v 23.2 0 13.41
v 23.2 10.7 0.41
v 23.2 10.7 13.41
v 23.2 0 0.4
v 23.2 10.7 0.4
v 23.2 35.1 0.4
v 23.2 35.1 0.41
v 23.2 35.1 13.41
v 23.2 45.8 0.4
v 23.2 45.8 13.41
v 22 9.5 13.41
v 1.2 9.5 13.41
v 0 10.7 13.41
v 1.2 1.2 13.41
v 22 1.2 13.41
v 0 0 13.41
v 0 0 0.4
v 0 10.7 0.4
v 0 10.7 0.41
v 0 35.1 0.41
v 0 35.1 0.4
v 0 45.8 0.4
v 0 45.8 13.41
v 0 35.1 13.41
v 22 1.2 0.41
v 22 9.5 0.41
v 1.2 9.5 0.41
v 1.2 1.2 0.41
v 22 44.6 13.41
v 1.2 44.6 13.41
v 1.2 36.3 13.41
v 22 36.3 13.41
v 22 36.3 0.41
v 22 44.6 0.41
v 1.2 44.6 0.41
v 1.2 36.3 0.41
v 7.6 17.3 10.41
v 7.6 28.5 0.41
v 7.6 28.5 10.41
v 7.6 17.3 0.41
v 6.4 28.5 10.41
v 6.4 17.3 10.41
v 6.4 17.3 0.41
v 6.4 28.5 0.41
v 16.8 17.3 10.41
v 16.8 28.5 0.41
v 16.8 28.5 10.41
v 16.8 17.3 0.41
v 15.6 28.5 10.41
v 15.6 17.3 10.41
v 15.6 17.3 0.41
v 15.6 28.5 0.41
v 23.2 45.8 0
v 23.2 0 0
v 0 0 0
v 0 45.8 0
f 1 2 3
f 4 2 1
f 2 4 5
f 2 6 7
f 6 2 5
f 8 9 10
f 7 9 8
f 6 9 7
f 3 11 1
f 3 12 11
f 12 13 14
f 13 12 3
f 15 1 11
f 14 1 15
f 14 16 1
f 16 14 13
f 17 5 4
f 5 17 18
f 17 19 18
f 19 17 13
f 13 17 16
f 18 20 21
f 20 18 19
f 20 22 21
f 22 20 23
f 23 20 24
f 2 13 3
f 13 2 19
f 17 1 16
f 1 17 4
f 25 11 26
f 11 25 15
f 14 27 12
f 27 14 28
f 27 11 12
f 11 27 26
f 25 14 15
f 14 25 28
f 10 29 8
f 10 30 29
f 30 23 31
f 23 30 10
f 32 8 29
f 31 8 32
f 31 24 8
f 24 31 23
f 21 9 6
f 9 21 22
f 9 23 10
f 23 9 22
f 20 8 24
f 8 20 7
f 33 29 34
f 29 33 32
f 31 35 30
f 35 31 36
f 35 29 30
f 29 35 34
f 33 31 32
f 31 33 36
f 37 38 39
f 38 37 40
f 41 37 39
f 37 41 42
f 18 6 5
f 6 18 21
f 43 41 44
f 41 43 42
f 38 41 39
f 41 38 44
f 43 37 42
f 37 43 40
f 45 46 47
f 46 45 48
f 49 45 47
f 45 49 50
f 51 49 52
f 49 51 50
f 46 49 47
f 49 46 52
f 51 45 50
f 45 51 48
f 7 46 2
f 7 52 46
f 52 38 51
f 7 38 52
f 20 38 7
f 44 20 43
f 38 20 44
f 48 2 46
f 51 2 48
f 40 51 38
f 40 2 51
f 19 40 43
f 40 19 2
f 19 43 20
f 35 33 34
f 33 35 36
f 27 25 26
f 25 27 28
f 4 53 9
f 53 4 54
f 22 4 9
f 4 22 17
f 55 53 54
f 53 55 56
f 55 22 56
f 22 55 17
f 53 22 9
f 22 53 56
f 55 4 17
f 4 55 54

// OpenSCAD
// file: ../../Base/Boxes.scad
// Fischertechnik Box Foundation
// Pre-designed Boxes

use <Constants.scad>

include <PlacementOptions.scad>

box190Width = 190;
box190Depth = 130;
box130Width = 130;
box130Depth = 95;
boxUsageHeight = 33.9;
boxWallThickness = 2.4;
boxBaseThickness = 1.0;
boxWebWidth = 3.0;

// getBoxWallThickness()
// Gets the wall thickness of a Fischertechnik Box

function getBoxWallThickness() = boxWallThickness;

// Gets the usable height of a fischertechnik box
function getBoxUsageHeight() = boxUsageHeight;

// Gets the thickness of the Fischertechnik box base.
function getBoxBaseThickness() = boxBaseThickness;

// Gets the width of a box web
function getBoxWebWidth() = boxWebWidth;

// Gets the usable inner space of a Box 190 as an x/y-list
function getBox190Space() = [
    box190Width - 2*getBoxWallThickness(), 
    box190Depth - 2*getBoxWallThickness() ];

// Imports the Fischertechnik empty box 130x190 mm and places it at position 0,0
// 190x130 are the outer sizes, the inner space is slightly smaller. Use getBox190Space() to get the inner sizes.
// This module needs the STL file "Fischertechnik Box 130x190.stl" in the library path.
// The box is positioned that the usable inner space is at the 0,0,0 position. The

module Box190() {
    translate([-getBoxWallThickness(),-getBoxWallThickness(),-getBoxBaseThickness()])
        import("Fischertechnik Box 130x190.stl", convexity=3);
}

// Gets the usable inner space of a Box 130 as an x/y-list
function getBox130Space() = [
    box130Width - 2*getBoxWallThickness(), 
    box130Depth - 2*getBoxWallThickness() ];

// Imports the Fischertechnik empty box 95x130 mm and places it at position 0,0
// 190x130 are the outer sizes, the inner space is slightly smaller. Use getBox190Space() to get the inner sizes.
// This module needs the STL file "Fischertechnik Box 95x130.stl" in the library path.
// The box is positioned that the usable inner space is at the 0,0,0 position. The

module Box130() {
    translate([-getBoxWallThickness(),-getBoxWallThickness(),-getBoxBaseThickness()])
        import("Fischertechnik Box 95x130.stl", convexity=3);
}

// Creates a web at the specified box walls
// corner 0 = LowerLeft, 1 = UpperLeft, 2 = UpperRight, 3 = LowerRight
// side 0 = LeftOfCorner, 1 = RightOfCorner
// distance = Distance in mm from the corner
// box = inner width and depth of the box (default: Box 190)
// webWidth = length of the web (default is 3 mms)
// webThickness = thickness of the web (default is 1 mm)

module BoxWeb(corner, side, distance, box=getBox190Space(), webWidth=getBoxWebWidth(), webThickness=1.0) {
    sink = getBoxWallThickness()/2;

    width = (corner % 2 == 0) ? 
            (side == LeftOfCorner ? webWidth : webThickness) :
            (side == LeftOfCorner ? webThickness : webWidth);

    depth = (corner % 2 == 0) ? 
            (side == RightOfCorner ? webWidth : webThickness) :
            (side == RightOfCorner ? webThickness : webWidth);
    
    xDiff = corner == LowerLeft ? 
                (side == LeftOfCorner ? -sink : distance) :
            (corner == UpperLeft ?                
                (side == LeftOfCorner ? distance : -sink) :
            (corner == UpperRight ?
                (side == LeftOfCorner ? box.x-webWidth+sink : box.x-distance-webThickness) :
                (side == LeftOfCorner ? box.x-distance-webThickness: box.x-webWidth+sink)));

    yDiff = corner == LowerLeft ? 
                (side == RightOfCorner ? -sink : distance) :
            (corner == UpperLeft ?
                (side == RightOfCorner ? box.y-distance : box.y-webWidth+sink) :
            (corner == UpperRight ?
                (side == RightOfCorner ? box.y-webWidth+sink : box.y-distance) :
                (side == RightOfCorner ? distance : -sink)));
    
    translate([xDiff, yDiff, -getExcess()])
        cube([width, depth, boxUsageHeight + 2*getExcess()]);
}
// file: ../../Base/Rotation.scad
// Fischertechnik Box Foundation
// Geometry Helpers Rotation

include <PlacementOptions.scad>

// getRotatedSpace(space, rotation=NoRotation)
// Rotates the space dependent on the specified rotation

function getRotatedSpace(space, rotation=NoRotation) = [
    (rotation == Rotate90 || rotation == Rotate270) ? space.y : space.x,
    (rotation == Rotate90 || rotation == Rotate270) ? space.x : space.y
];

// Rotates the given space around the fixed left lower corner
// space = the space the children needs as width/depth list [width,depth]
// rotation = 0 Rotate0 degrees, 1 Rotate90 degrees, 2 Rotate180 degrees, 3 Rotate270 degrees (equivalent to -90)

module RotateFix(space, rotation=Rotate0) {
    dy = (rotation == Rotate0 || rotation == Rotate270) ? 0 :
        (rotation == Rotate90) ? space.x :
        space.y;
    dx = (rotation < Rotate180) ? 0 :
        (rotation == Rotate180) ? space.x :
        space.y;
    
    translate([dx, dy, 0])
        rotate([0, 0, rotations[rotation]])
            children();
}
// file: ../../Base/Alignment.scad
// Fischertechnik Box Foundation
// Geometry Helpers Alignment

include <PlacementOptions.scad>

// getAlignedX(elementWidth, spaceWidth, align=AlignRight, offset=0)
// Gets the aligned X offset of an element with the given
// width in the given space.
// elementWidth = The width of the element to positon
// spaceWidth = The space where the element should be aligned
// align = 0 AlignLeft, 1 AlignCenter, 2 AlignRight
// offset = an optional offset from the aligned position. When
// aligned left or centered, then positive values are in X direction.
// When aligned right then positive values are in negative X direction.

function getAlignedX(elementWidth, spaceWidth, align=AlignRight, offset=0) =
    (align == AlignLeft) ?
        offset :
        ((align == AlignCenter) ?
        (spaceWidth - elementWidth)/2 + offset :
        spaceWidth - offset - elementWidth);

// getAlignedY(elementDepth, spaceDepth, align=AlignTop, offset=0)
// Gets the aligned Y offset of an element with the given
// depth in the given space.
// elementDepth = The depth of the element to positon
// spaceDepth = The space where the element should be aligned
// align = 0 AlignBottom, 1 AlignCenter, 2 AlignTop
// offset = an optional offset from the aligned position. When
// aligned bottom or centered, then positive values are in Y direction.
// When aligned top then positive values are in negative Y direction.

function getAlignedY(elementDepth, spaceDepth, align=AlignTop, offset=0) =
    (align == AlignBottom) ?
        offset :
        ((align == AlignCenter) ?
        (spaceDepth - elementDepth)/2 + offset :
        spaceDepth - offset - elementDepth);
// file: ../../Base/PlacementOptions.scad
// Fischertechnik Box Foundation
// Placement Options

// Alignment
NoAlign = 0;
AlignLeft = 1;
AlignBottom = 2;
AlignCenter = 3;
AlignRight = 4;
AlignTop = 5;

// Element rotation degree steps
rotations = [0, -90, -180, -270];

// Rotation
NoRotation = 0;
Rotate0 = 0;
Rotate90 = 1;
Rotate180 = 2;
Rotate270 = 3;

// Docking (seen from above)
NoDock = -1;
DockLeft = 0;
DockTop = 1;
DockRight = 2;
DockCorner = 2;
DockBottom = 3;

// Web corners
LowerLeft = 0;
UpperLeft = 1;
UpperRight = 2;
LowerRight = 3;

// Web position relative to corner
LeftOfCorner = 0;
RightOfCorner = 1;
// file: ../../Base/Placement.scad
// Fischertechnik Box Foundation
// Geometry Helpers Placement

use <Constants.scad>
use <Alignment.scad>
use <Rotation.scad>
use <Boxes.scad>

include <PlacementOptions.scad>

// Place(x=0, y=0, elementSpace=[0,0], alignX=AlignLeft, alignY=AlignBottom, rotation=Rotate0, boxSpace=getBox190Space())
// Places the child at the specified position
// y = Y-Position. This is a relative position when an X aligment is specified.
// x = X-Position. This is a relative position when an Y aligment is specified.
// elementSpace = space of the element to be placed [x,y]
// alignX = -1=NoAlign, 0 AlignLeft, 1 AlignCenter, 3 AlignRight (elementSpace and boxSpace required!)
// alignY = -1=NoAlign, 2 AlignBottom, 1 AlignCenter, 4 AlignTop (elementSpace and boxSpace required!)
// rotation = 0 Rotate0 0 degrees, 1 Rotate90 90 degrees, 
// 2 Rotate180 180 degrees, 3 Rotate270 270 degrees (equivalent to -90)
// boxSpace = Inner space of the box where the placement occurs [x,y] - default is Box 190x130 inner space

module Place(x=0, y=0, elementSpace=[0,0], 
  alignX=AlignLeft, alignY=AlignBottom, 
  rotation=NoRotation, boxSpace=getBox190Space()) {

    module Position(x, y, space, rotation=Rotate0) {
        translate([x, y, 0])
            RotateFix(space, rotation)
                children();
    }

    space = getRotatedSpace(elementSpace, rotation);
    alignedX = getAlignedX(space.x, boxSpace.x, alignX, x);
    alignedY = getAlignedY(space.y, boxSpace.y, alignY, y);
    Position(alignedX, alignedY, elementSpace, rotation)
        children();
}

// Center(space=getBox130Space(), elementSpace=[0,0])
// space = Space where the children is centered. For cylinder use centered=true and no elementSpace.
// elementSpace = space of the element to be centered [x,y]

module Center(space=getBox190Space(), elementSpace=[0,0]) {
    translate([(space.x - elementSpace.x) / 2, (space.y - elementSpace.y) / 2])
        children(0);
}

// CenterHorizontal(width=0, y=0, offset=0, space=getBox130Space())
// space = Space where the children is centered. For cylinder use centered=true and no elementSpace.
// elementSpace = space of the element to be centered [x,y]

module CenterHorizontal(width=0, y=0, offset=0, space=getBox190Space()) {
    translate([(space.x - width) / 2 + offset, y])
        children(0);
}

// CenterVertical(depth=0, x=0, offset=0, space=getBox130Space())
// space = Space where the children is centered. For cylinder use centered=true and no elementSpace.
// elementSpace = space of the element to be centered [x,y]

module CenterVertical(depth=0, x=0, offset=0, space=getBox190Space()) {
    translate([x, (space.y - depth) / 2 + offset])
        children(0);
}
// file: ../../Elements/FrameLockingRing.scad
// Fischertechnik Box Library
// Frame for Locking Ring
// 31020

use <../Base/Constants.scad>
use <../ModelBase/Simple.scad>

width = 20;
depth = 7.5;
height = 13;

// getFrameLockingRingSpace(columns=1, rows=1)
// columns = Count of locking rings in X direction (width of ring)
// rows = Count of locking rings in Y direction (depth of ring)
// Gets the space the frame locking ring needs as width (.x and .y as a list)

function getFrameLockingRingSpace(columns=1, rows=1) = getFrameOuterVolume([width*columns, depth*rows, height]);

// FrameLockingRing(columns, rows, smallSideIsX)
// columns = Count of locking rings in X direction (width of ring)
// rows = Count of locking rings in Y direction (depth of ring)
// The walls of the frame are 13 mm high. The small side is 7.5 mm wide, the large side
// is 20 mm wide.

module FrameLockingRing(columns=1, rows=1) {
    Frame([width*columns, depth*rows, height]);
}

// Tests
color("lightgray")
    FrameLockingRing(1);
// file: ../../Elements/HolderWinchDrum.scad
// Fischertechnik Box Library
// Holder for Winch Drum
// 31016

use <../Base/Constants.scad>
use <../Base/Placement.scad>
use <../ModelBase/Simple.scad>

width = 20;
depth = 25;
height = 10;

// getWinchDrumHolderSpace()
// Gets the space the winch drum holder needs as width and depth (.x and .y as a list)

function getHolderWinchDrumSpace() = [width, depth, height];

// HolderWinchDrum()
// Two walls for holding the 31016 winch drum.

module HolderWinchDrum() {
    holderDepth = 11.2;
    holderDistance = 8;
    
    Space(getHolderWinchDrumSpace());
    
    module Holders() {
        Wall([getDividerThickness(), holderDepth, height]);
        translate([holderDistance + getDividerThickness(), 0])
            Wall([getDividerThickness(), holderDepth, height]);
    }
    
    Center(getHolderWinchDrumSpace(), [holderDistance + 2*getDividerThickness(), holderDepth]) {
        Holders();
    }
}

// Tests
color("lightgray")
HolderWinchDrum();
// file: ../../Elements/AxisClip10.scad
// Fischertechnik Box Library
// Axis for clip 10
// 31023

use <../ModelBase/Simple.scad>

width = 12;
depth = 12;
height = 23;

// getAxisClip10Space()
// Gets the space of a frame for a clip 10 with spring ring (mot2)

function getAxisClip10Space() = [width, depth, height];

// AxisClip10()
// Axis for clip 10 with spring ring (mot2)

module AxisClip10() {
    LeveledAxisWithSpace(height, height-10, getAxisClip10Space());
}

// Tests
color("lightgray")
AxisClip10();
// file: ../../Base/Constants.scad
// Fischertechnik Box Foundation
// Constants

// Constant values necessary for multiple elements

// Base constants
dividerThickness = 1.2;
excess = 0.01;
fragments = 90;
tolerance = 0.8;

// Gets the thickness of a divider 
function getDividerThickness() = dividerThickness;

// Gets the excess that is used to merge walls into each other
function getExcess() = excess;

// Gets amount of fragments of a cylinder
function getFragments() = fragments;

// Gets the inner tolerance of a frame to each side
function getTolerance() = tolerance;


// Fischertechnik specific constants
axisDiameter = 4;
axisBottomDiameter = axisDiameter + 1;
standardEdgeDistance = 2.5;
standardWebDistance = 11.5;
standardCornerLength = 15;
tubeWallFactor = 0.8;

// Gets axis diameter
function getAxisDiameter() = axisDiameter;

// Gets axis bottom diameter for thicker part at the bottom
function getAxisBottomDiameter() = axisBottomDiameter;

// gets the standard distance to the wall of the box for dockable frames with webs
function getStandardEdgeDistance() = standardEdgeDistance;

// gets the standard distance of each web to the corner of the dockable frame
function getStandardWebDistance() = standardWebDistance;

// gets the standard length of the corner walls of a dockable frame
function getStandardCornerLength() = standardCornerLength;

// gets the wall thickness of a tube.
function getTubeWallThickness() = tubeWallFactor * getDividerThickness();
// file: ../../Elements/HolderWinchDrumWithLockingRings.scad
// Fischertechnik Box Library
// Complete Winch Drum with Locking Rings
// 31018 + 2 x 31020

use <../ModelBase/Simple.scad>
use <HolderWinchDrum.scad>
use <FrameLockingRing.scad>

distance = 24.4;

// getHolderWinchDrumWithLockingRingsSpace()
// Gets the space the holder winch drum with locking rings needs as width (.x and .y as a list)

function getHolderWinchDrumWithLockingRingsSpace() = [
    getFrameLockingRingSpace().x, 
    getFrameLockingRingSpace().y * 2 + distance,
    getFrameLockingRingSpace().z];

// HolderWinchDrumWithLockingRings
// Combination of a winch drum holder with two locking ring holders at both ends

module HolderWinchDrumWithLockingRings() {    
    yOffsetFrame = distance + getFrameLockingRingSpace()[1];
    
    Space(getHolderWinchDrumWithLockingRingsSpace());
    
    FrameLockingRing();
    translate([0, yOffsetFrame, 0])
        FrameLockingRing();
    
    xOffset = (getFrameLockingRingSpace()[0] - getHolderWinchDrumSpace()[0]) / 2;
    yOffset = (distance + 2 * getFrameLockingRingSpace()[1] - getHolderWinchDrumSpace()[1]) / 2;
    
    translate([xOffset, yOffset, 0])
        HolderWinchDrum();
}

// Tests
color("lightgray")
HolderWinchDrumWithLockingRings();
// file: ../TestPrint.scad
// 3D Print Test Base

use <../Base/Constants.scad>

use <../Elements/AxisClip10.scad>

module TestPrint(elementSpace) {
    cube([elementSpace.x, elementSpace.y, 0.4]);
    translate([0,0,0.4+getExcess()]) {
        children();
    }
}

TestPrint(getAxisClip10Space())
    AxisClip10();
// main file
// 3D Print Test Base
// HolderWinchDrumWithLockingRings

use <../TestPrint.scad>
use <../../Elements/HolderWinchDrumWithLockingRings.scad>

TestPrint(getHolderWinchDrumWithLockingRingsSpace())
    HolderWinchDrumWithLockingRings();
